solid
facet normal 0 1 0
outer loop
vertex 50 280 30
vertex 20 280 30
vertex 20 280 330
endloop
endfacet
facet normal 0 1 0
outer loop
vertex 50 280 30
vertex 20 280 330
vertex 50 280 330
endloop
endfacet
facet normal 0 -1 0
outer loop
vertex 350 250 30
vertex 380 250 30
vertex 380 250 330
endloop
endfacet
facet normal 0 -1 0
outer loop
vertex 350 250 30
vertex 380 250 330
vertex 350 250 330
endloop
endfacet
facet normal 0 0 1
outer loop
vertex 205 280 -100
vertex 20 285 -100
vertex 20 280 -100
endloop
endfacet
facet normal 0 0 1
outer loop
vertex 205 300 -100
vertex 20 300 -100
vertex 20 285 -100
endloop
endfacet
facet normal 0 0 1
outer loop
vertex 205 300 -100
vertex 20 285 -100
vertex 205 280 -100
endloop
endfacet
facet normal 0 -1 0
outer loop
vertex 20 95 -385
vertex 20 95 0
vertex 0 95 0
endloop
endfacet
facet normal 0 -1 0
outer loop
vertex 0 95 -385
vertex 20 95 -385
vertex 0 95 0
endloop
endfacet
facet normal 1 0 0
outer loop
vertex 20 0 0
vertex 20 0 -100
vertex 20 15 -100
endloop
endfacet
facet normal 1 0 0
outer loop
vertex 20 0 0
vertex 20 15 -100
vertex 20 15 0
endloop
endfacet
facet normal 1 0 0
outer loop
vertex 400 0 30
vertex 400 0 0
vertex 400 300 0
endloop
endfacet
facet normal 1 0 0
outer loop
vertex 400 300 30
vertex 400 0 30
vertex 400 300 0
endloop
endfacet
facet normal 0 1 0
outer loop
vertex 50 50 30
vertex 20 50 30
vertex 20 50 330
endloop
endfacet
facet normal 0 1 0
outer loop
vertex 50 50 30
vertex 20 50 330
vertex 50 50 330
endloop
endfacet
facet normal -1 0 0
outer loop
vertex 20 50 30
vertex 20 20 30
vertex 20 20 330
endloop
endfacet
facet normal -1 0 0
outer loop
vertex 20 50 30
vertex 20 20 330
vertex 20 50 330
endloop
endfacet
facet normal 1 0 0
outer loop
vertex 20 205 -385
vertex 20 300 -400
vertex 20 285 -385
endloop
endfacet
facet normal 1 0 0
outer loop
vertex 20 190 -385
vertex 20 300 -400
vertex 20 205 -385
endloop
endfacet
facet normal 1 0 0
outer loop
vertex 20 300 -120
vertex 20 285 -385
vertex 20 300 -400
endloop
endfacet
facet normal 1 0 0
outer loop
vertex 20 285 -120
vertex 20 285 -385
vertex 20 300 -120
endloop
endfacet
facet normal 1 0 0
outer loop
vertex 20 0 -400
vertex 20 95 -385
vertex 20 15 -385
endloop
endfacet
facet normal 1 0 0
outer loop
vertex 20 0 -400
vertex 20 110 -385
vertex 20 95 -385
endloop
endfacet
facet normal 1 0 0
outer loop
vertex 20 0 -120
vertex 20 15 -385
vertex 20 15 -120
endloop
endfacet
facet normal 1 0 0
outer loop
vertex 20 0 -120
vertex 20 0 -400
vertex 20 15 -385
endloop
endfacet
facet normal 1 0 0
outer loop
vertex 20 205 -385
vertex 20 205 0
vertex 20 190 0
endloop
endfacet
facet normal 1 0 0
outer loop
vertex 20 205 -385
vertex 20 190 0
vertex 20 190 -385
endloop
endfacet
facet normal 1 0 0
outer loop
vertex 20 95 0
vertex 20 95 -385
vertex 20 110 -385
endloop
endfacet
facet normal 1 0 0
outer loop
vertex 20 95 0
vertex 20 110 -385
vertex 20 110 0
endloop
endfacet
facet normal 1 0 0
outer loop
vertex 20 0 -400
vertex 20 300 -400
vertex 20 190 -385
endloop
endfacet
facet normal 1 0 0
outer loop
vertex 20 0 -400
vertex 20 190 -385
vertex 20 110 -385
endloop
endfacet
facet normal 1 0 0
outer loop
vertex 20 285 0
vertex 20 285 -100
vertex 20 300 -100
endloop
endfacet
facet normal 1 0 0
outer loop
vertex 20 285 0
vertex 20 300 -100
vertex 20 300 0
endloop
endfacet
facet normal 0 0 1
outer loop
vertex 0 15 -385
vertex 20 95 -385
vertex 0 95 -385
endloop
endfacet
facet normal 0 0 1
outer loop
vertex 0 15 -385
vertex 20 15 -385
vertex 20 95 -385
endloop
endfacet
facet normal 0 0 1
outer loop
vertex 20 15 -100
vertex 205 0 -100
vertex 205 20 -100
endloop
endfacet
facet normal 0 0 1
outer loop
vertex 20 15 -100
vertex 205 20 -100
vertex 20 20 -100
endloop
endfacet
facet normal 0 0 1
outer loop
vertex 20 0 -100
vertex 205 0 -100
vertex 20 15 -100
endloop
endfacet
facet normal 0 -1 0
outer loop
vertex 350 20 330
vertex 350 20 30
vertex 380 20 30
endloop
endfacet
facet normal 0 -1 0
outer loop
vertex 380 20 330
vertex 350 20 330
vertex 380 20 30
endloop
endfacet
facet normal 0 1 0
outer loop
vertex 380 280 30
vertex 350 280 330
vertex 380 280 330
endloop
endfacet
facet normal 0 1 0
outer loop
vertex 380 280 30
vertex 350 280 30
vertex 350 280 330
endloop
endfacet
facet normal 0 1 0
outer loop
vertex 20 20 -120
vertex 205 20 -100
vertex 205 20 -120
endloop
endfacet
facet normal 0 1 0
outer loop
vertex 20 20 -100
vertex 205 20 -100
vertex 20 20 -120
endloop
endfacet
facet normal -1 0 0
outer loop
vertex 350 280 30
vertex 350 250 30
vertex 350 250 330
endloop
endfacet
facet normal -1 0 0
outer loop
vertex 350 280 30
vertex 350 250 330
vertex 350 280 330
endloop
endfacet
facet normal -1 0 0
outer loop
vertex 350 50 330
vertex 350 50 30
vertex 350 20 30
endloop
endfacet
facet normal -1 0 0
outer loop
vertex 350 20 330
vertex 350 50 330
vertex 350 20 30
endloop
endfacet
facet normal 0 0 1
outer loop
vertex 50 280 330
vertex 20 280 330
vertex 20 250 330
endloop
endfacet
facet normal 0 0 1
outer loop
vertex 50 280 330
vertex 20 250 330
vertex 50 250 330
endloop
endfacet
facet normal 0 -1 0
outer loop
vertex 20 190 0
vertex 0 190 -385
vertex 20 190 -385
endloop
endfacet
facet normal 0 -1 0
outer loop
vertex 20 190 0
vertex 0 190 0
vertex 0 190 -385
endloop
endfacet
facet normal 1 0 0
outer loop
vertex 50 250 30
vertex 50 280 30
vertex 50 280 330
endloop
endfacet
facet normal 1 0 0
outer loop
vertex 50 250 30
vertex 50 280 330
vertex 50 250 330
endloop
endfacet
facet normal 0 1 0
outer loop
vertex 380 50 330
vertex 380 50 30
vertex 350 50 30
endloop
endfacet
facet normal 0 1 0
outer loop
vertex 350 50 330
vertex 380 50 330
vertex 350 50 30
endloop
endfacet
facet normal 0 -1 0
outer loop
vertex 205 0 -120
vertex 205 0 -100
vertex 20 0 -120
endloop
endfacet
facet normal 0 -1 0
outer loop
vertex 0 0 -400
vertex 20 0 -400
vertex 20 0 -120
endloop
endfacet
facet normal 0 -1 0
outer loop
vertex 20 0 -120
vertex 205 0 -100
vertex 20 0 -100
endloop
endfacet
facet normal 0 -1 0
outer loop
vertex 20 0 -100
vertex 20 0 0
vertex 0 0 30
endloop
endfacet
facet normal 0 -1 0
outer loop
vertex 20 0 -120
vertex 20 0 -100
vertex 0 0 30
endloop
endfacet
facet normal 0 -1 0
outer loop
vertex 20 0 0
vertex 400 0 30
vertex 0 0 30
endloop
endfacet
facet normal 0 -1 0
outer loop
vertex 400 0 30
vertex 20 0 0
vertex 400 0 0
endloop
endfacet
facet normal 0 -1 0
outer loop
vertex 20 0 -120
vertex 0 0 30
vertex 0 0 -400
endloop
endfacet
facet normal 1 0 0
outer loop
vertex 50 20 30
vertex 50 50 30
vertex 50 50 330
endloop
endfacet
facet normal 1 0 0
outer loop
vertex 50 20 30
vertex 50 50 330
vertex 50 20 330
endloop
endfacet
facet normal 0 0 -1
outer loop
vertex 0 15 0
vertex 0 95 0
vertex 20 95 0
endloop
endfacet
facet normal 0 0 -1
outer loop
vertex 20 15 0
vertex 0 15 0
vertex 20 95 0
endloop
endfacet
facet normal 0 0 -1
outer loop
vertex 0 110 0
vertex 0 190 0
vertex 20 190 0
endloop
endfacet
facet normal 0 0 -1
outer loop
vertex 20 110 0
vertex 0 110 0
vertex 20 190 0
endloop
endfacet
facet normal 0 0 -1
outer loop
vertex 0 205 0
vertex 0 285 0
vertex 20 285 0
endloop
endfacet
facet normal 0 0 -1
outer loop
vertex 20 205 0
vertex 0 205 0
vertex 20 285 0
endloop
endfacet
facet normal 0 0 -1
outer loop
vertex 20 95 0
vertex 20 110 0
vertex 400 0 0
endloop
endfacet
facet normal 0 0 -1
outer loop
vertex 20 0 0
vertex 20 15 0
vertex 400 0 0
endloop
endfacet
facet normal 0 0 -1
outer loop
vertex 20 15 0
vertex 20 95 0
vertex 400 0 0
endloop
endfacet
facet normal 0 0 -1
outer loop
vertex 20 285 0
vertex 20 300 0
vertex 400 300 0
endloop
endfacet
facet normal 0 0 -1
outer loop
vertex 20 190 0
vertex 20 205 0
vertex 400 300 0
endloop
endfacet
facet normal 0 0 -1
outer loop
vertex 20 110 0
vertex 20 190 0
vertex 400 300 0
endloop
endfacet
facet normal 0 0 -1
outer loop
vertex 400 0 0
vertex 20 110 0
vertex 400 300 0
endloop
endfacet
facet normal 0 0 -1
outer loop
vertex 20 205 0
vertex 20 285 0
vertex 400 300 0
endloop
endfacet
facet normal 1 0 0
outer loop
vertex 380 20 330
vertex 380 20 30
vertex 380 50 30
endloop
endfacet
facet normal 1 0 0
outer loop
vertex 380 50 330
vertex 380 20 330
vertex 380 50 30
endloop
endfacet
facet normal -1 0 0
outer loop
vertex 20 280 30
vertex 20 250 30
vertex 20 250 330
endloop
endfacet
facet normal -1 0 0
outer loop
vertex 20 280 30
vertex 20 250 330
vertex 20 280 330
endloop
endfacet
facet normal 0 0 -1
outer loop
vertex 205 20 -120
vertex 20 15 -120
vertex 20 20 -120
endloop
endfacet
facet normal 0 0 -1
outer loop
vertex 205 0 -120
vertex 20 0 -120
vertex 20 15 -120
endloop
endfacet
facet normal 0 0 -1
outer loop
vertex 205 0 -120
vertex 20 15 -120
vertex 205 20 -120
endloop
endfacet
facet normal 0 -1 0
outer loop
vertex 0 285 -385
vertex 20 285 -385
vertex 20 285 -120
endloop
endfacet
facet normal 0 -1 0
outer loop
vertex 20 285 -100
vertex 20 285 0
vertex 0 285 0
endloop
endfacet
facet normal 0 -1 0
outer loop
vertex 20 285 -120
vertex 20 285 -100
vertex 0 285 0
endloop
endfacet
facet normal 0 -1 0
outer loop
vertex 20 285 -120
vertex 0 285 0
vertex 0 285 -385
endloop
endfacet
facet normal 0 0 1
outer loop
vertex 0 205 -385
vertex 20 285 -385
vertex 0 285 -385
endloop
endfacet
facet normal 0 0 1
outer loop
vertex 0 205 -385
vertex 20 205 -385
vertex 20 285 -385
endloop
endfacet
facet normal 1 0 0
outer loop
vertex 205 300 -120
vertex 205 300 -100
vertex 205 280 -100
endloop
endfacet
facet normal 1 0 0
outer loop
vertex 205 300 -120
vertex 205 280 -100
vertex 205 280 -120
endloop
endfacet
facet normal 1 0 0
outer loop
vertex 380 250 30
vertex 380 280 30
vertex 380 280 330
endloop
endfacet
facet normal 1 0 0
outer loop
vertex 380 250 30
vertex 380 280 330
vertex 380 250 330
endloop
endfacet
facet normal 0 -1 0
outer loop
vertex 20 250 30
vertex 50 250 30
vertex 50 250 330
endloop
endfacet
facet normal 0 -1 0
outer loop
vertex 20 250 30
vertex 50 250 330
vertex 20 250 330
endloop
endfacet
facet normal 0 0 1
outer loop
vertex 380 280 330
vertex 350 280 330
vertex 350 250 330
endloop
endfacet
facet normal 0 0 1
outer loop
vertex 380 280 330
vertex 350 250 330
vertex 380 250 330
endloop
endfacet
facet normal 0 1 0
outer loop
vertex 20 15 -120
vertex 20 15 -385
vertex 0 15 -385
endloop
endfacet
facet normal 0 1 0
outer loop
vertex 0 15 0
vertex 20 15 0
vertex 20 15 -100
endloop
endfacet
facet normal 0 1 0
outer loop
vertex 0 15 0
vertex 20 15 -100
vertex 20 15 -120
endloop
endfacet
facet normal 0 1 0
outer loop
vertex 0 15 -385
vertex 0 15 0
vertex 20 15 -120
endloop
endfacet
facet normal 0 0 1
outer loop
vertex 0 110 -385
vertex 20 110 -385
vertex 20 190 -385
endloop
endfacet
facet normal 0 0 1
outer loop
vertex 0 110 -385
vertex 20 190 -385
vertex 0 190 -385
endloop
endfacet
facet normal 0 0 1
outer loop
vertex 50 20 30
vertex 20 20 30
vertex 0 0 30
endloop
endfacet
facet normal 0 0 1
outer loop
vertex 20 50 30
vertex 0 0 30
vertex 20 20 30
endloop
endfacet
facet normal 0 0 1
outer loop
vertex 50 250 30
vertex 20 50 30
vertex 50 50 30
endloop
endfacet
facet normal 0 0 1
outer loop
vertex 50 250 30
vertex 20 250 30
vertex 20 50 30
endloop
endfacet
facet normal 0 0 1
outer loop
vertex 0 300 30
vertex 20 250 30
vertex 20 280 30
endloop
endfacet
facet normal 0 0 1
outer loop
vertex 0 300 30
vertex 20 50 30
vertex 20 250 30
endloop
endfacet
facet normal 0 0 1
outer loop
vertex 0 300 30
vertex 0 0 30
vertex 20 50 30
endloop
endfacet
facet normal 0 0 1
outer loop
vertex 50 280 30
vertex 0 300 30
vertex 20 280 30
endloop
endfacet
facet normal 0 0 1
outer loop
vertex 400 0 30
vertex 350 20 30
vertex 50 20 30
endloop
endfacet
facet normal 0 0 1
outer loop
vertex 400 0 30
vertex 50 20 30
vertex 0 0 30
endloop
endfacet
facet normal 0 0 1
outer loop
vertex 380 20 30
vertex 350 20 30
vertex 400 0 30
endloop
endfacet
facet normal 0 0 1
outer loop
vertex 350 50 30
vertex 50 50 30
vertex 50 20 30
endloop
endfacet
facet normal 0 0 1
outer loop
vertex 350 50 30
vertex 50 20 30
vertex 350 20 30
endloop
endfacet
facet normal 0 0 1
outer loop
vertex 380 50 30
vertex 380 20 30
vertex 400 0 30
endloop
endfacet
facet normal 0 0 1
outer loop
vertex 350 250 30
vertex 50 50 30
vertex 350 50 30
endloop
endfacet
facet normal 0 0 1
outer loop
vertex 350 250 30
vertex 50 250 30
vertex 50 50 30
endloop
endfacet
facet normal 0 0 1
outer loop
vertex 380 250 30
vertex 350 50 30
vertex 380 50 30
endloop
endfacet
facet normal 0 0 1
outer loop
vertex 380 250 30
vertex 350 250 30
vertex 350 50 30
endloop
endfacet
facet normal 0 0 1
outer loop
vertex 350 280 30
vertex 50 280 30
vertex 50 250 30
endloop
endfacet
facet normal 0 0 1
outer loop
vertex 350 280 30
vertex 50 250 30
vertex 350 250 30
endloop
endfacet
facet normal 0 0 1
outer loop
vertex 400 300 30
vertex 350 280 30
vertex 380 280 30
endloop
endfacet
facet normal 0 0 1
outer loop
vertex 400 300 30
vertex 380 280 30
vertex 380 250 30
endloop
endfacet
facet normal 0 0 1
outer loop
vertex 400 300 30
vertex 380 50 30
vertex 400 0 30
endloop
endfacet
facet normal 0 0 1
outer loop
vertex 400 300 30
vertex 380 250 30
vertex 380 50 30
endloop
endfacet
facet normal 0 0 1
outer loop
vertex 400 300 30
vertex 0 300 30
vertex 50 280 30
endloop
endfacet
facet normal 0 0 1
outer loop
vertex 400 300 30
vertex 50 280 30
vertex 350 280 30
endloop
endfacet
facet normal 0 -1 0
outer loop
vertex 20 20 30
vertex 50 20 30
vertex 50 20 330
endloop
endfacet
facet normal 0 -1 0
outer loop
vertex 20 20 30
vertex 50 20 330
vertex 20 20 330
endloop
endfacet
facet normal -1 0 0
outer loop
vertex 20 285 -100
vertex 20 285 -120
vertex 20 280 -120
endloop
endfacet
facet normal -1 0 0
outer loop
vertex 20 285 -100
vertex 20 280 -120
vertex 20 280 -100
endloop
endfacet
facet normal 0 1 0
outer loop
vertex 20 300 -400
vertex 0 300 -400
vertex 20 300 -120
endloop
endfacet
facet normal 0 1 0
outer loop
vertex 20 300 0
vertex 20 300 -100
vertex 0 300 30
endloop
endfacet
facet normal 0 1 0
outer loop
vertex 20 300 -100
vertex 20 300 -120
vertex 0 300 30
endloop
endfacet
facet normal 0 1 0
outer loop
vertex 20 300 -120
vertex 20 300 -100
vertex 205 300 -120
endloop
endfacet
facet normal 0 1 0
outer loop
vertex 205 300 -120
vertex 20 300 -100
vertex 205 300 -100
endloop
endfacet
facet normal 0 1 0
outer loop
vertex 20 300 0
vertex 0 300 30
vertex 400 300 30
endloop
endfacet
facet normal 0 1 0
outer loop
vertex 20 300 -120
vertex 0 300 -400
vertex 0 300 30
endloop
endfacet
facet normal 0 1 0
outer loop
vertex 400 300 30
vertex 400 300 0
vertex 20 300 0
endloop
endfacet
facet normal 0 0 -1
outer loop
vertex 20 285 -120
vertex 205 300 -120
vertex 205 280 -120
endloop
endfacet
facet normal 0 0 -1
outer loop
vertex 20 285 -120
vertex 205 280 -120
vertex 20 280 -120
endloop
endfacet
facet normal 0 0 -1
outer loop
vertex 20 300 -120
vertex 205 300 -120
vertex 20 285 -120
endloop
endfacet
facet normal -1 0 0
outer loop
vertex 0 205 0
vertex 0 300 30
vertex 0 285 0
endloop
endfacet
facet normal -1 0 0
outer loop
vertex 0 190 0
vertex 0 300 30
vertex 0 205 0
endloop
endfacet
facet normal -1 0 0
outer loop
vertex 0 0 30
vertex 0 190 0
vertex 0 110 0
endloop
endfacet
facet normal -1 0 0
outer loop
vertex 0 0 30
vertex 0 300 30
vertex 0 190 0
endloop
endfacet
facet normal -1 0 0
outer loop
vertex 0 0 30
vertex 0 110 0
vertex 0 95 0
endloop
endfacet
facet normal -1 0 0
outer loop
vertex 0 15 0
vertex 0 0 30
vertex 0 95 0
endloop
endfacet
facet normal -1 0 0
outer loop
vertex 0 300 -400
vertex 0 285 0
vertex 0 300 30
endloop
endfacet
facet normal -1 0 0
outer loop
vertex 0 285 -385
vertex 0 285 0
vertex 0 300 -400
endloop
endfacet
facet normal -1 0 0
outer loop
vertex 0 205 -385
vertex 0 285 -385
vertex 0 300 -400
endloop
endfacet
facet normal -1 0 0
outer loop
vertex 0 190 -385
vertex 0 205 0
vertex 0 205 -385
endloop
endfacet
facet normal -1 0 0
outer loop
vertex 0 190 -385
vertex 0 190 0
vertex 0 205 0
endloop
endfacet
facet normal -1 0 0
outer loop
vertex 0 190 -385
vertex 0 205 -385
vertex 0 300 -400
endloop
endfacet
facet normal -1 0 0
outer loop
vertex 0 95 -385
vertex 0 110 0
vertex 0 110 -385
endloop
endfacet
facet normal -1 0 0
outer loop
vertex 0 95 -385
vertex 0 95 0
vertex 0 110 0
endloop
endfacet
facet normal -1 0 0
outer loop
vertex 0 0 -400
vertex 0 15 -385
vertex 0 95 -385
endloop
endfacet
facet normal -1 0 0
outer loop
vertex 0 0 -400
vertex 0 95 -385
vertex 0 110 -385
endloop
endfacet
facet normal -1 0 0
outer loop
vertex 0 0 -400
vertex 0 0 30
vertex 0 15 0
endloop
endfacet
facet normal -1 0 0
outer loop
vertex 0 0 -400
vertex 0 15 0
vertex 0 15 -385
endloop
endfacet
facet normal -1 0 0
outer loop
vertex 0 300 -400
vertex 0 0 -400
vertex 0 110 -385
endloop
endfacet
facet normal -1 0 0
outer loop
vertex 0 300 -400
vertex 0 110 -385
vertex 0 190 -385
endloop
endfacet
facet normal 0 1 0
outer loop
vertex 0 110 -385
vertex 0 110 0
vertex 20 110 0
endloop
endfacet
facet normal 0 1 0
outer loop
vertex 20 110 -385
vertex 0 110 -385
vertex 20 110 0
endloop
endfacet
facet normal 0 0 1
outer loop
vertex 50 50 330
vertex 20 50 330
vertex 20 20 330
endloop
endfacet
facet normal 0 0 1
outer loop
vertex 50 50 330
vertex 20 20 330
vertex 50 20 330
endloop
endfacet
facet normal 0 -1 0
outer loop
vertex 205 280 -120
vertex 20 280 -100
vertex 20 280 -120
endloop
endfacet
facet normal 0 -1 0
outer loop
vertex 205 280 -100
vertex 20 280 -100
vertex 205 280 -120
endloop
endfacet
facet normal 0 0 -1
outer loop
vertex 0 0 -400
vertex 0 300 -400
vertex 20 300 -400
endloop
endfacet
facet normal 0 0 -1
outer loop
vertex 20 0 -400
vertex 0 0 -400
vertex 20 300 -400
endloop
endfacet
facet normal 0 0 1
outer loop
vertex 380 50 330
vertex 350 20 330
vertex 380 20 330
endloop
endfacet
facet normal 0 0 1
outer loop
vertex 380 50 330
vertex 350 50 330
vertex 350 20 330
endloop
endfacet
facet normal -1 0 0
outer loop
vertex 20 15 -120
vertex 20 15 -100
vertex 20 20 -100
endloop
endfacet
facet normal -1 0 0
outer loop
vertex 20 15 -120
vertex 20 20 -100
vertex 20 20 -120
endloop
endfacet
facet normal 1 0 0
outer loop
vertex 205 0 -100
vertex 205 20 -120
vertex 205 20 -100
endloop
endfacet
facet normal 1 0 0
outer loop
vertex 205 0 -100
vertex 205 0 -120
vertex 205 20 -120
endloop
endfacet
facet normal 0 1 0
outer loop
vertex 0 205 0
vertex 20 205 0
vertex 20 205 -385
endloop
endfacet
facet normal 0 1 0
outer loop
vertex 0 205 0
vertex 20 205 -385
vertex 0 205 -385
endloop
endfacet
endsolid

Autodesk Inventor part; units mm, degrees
ref_plane "YZ Plane" through (0, 0, 0) normal (1, 0, 0) x (0, 1, 0)
ref_plane "XY Plane" through (0, 0, 0) normal (0, 0, 1) x (1, 0, 0)
sketch "Sketch1" plane through (0, 0, 0) normal (0, 0, 1) x (1, 0, 0)
  line L0 (0, 0) -> (400, 0)
  line L1 (400, 0) -> (400, 300)
  line L2 (400, 300) -> (0, 300)
  line L3 (0, 300) -> (0, 0)
  dimension "d0" = 400
  dimension "d1" = 300
extrude "Extrusion1" add sketch "Sketch1" along normal blind 30
sketch "Sketch2" plane through (0, 0, 30) normal (0, 0, 1) x (1, 0, 0)
  line L0 (20, 280) -> (50, 280)
  line L1 (50, 280) -> (50, 250)
  line L2 (50, 250) -> (20, 250)
  line L3 (20, 250) -> (20, 280)
  line L4 (350, 280) -> (380, 280)
  line L5 (380, 280) -> (380, 250)
  line L6 (380, 250) -> (350, 250)
  line L7 (350, 250) -> (350, 280)
  line L8 (350, 20) -> (380, 20)
  line L9 (380, 20) -> (380, 50)
  line L10 (380, 50) -> (350, 50)
  line L11 (350, 50) -> (350, 20)
  line L12 (0, 300) -> (0, 0) projected
  line L13 (400, 300) -> (0, 300) projected
  line L14 (400, 0) -> (400, 300) projected
  line L15 (0, 0) -> (400, 0) projected
  line L16 (20, 50) -> (50, 50)
  line L17 (50, 50) -> (50, 20)
  line L18 (50, 20) -> (20, 20)
  line L19 (20, 20) -> (20, 50)
  dimension "d4" = 30
  dimension "d5" = 30
  dimension "d6" = 30
  dimension "d7" = 30
  dimension "d10" = 30
  dimension "d11" = 30
  dimension "d12" = 20
  dimension "d13" = 20
  dimension "d14" = 20
  dimension "d15" = 20
  dimension "d16" = 20
  dimension "d17" = 30
  dimension "d18" = 30
  dimension "d19" = 20
  dimension "d20" = 20
extrude "Extrusion2" add sketch "Sketch2" along normal blind 300 contours L0 L1 L2 L3 | L4 L5 L6 L7 | L11 L10 L9 L8 | L16 L17 L18 L19
sketch "Sketch3" plane through (0, 0, 0) normal (0, 0, -1) x (-1, 0, 0)
  line L0 (-400, 300) -> (0, 300) projected
  line L1 (0, 300) -> (-20, 300)
  line L2 (-20, 300) -> (-20, 285)
  line L3 (-20, 285) -> (0, 285)
  line L4 (0, 285) -> (0, 300)
  line L5 (0, 300) -> (0, 0) projected
  line L6 (-20, 20) -> (-50, 20) projected
  line L7 (0, 0) -> (-20, 0)
  line L8 (0, 190) -> (-20, 190)
  line L9 (-20, 190) -> (-20, 205)
  line L10 (-20, 205) -> (0, 205)
  line L11 (0, 205) -> (0, 190)
  line L12 (0, 110) -> (-20, 110)
  line L13 (-20, 110) -> (-20, 95)
  line L14 (-20, 95) -> (0, 95)
  line L15 (0, 95) -> (0, 110)
  line L16 (0, 0) -> (-20, 0)
  line L17 (-20, 0) -> (-20, 15)
  line L18 (-20, 15) -> (0, 15)
  line L19 (0, 15) -> (0, 0)
  point P0 (0, 95)
  point P1 (0, 205)
  dimension "d31" = 20
  dimension "d32" = 15
  dimension "d33" = 20
  dimension "d34" = 15
  dimension "d35" = 20
  dimension "d36" = 15
  dimension "d37" = 15
  dimension "d38" = 20
  dimension "d39" = 80
  dimension "d40" = 80
  dimension "d41" = 80
extrude "Extrusion3" add sketch "Sketch3" along normal blind 385
sketch "Sketch4" plane through (0, 0, 0) normal (0, 1, 0) x (-1, 0, 0)
  line L0 (-20, 0) -> (-20, -385) projected
  line L1 (0, -400) -> (-20, -400)
  line L2 (-20, -400) -> (-20, -385)
  line L3 (-20, -385) -> (0, -385)
  line L4 (0, -385) -> (0, -400)
  point P0 (0, 0)
  dimension "d44" = 20
  dimension "d45" = 15
extrude "Extrusion4" add sketch "Sketch4" along normal blind 300
sketch "Sketch5" plane through (0, 0, 0) normal (0, 1, 0) x (-1, 0, 0)
  line L0 (-20, 0) -> (-20, -385) projected
  line L1 (-20, -120) -> (-205, -120)
  line L2 (-205, -120) -> (-205, -100)
  line L3 (-205, -100) -> (-20, -100)
  line L4 (-20, -100) -> (-20, -120)
  line L5 (-400, 0) -> (-20, 0) projected
  point P0 (0, 0)
  point P1 (-20, -100)
  dimension "d48" = 185
  dimension "d49" = 20
  dimension "d50" = 100
ref_plane "Work Plane1" through (0, 150, 0) normal (0, 1, 0) x (-1, 0, 0)
extrude "Extrusion5" add sketch "Sketch5" along normal blind 20
mirror "Mirror1" about plane through (0, 150, 0) normal (0, 1, 0) of "Extrusion5"
properties part number "Maitri_chair"
